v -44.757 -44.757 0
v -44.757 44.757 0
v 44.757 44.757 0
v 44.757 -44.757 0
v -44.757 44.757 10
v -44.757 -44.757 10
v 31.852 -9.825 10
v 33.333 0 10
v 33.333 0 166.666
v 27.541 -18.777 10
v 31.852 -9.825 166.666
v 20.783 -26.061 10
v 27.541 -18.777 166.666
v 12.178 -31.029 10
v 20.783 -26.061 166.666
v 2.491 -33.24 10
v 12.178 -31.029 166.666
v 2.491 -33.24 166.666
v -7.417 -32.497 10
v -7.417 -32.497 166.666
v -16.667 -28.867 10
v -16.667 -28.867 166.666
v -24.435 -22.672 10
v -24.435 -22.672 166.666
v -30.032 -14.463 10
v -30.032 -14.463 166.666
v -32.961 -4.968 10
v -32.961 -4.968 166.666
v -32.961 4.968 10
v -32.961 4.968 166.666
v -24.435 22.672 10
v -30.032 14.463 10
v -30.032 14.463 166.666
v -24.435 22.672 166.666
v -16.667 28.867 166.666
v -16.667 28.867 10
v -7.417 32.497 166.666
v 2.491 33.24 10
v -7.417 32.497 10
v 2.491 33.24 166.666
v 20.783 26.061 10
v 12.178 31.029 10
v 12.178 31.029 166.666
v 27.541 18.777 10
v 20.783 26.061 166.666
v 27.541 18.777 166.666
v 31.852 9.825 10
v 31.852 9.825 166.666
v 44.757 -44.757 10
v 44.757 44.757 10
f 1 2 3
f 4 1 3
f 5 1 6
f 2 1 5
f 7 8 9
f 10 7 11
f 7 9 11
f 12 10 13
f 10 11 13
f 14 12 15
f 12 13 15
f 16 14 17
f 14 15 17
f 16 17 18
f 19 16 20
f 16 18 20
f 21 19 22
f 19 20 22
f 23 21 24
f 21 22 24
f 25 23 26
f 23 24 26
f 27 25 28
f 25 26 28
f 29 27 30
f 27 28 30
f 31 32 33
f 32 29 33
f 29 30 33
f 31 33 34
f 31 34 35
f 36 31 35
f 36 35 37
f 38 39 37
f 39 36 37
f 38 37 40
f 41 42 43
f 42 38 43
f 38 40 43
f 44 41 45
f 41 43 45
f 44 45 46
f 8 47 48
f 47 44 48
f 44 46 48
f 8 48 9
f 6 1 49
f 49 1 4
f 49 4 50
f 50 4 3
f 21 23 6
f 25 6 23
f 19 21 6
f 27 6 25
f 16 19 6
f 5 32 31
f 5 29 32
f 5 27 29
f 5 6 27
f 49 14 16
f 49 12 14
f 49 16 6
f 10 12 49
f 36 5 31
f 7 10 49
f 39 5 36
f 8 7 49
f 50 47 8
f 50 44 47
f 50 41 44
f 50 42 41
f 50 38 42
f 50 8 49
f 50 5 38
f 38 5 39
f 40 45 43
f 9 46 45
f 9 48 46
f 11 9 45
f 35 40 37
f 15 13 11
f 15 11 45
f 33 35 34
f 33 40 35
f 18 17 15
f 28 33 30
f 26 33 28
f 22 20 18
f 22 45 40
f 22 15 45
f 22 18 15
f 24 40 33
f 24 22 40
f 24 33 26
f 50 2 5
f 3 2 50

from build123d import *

# Parameters (mm, degrees)
F0_W     = 33.333
F0_H     = 166.666
F2_W     = 89.51439
F2_H     = 89.51439
F3_DEPTH = 10


with BuildPart() as f1:
    # F0 (on Front) → F1 (revolve)
    with BuildSketch(Plane.XZ):
        with Locations((16.6665, 83.333)):
            Rectangle(F0_W, F0_H)
    revolve(axis=Axis((0, 0, 83.333), (0, 0, -1)))

    # F2 (on Top) → F3 (join)
    with BuildSketch(Plane.XY):
        Rectangle(F2_W, F2_H)
    extrude(amount=F3_DEPTH)


solid = f1.part
